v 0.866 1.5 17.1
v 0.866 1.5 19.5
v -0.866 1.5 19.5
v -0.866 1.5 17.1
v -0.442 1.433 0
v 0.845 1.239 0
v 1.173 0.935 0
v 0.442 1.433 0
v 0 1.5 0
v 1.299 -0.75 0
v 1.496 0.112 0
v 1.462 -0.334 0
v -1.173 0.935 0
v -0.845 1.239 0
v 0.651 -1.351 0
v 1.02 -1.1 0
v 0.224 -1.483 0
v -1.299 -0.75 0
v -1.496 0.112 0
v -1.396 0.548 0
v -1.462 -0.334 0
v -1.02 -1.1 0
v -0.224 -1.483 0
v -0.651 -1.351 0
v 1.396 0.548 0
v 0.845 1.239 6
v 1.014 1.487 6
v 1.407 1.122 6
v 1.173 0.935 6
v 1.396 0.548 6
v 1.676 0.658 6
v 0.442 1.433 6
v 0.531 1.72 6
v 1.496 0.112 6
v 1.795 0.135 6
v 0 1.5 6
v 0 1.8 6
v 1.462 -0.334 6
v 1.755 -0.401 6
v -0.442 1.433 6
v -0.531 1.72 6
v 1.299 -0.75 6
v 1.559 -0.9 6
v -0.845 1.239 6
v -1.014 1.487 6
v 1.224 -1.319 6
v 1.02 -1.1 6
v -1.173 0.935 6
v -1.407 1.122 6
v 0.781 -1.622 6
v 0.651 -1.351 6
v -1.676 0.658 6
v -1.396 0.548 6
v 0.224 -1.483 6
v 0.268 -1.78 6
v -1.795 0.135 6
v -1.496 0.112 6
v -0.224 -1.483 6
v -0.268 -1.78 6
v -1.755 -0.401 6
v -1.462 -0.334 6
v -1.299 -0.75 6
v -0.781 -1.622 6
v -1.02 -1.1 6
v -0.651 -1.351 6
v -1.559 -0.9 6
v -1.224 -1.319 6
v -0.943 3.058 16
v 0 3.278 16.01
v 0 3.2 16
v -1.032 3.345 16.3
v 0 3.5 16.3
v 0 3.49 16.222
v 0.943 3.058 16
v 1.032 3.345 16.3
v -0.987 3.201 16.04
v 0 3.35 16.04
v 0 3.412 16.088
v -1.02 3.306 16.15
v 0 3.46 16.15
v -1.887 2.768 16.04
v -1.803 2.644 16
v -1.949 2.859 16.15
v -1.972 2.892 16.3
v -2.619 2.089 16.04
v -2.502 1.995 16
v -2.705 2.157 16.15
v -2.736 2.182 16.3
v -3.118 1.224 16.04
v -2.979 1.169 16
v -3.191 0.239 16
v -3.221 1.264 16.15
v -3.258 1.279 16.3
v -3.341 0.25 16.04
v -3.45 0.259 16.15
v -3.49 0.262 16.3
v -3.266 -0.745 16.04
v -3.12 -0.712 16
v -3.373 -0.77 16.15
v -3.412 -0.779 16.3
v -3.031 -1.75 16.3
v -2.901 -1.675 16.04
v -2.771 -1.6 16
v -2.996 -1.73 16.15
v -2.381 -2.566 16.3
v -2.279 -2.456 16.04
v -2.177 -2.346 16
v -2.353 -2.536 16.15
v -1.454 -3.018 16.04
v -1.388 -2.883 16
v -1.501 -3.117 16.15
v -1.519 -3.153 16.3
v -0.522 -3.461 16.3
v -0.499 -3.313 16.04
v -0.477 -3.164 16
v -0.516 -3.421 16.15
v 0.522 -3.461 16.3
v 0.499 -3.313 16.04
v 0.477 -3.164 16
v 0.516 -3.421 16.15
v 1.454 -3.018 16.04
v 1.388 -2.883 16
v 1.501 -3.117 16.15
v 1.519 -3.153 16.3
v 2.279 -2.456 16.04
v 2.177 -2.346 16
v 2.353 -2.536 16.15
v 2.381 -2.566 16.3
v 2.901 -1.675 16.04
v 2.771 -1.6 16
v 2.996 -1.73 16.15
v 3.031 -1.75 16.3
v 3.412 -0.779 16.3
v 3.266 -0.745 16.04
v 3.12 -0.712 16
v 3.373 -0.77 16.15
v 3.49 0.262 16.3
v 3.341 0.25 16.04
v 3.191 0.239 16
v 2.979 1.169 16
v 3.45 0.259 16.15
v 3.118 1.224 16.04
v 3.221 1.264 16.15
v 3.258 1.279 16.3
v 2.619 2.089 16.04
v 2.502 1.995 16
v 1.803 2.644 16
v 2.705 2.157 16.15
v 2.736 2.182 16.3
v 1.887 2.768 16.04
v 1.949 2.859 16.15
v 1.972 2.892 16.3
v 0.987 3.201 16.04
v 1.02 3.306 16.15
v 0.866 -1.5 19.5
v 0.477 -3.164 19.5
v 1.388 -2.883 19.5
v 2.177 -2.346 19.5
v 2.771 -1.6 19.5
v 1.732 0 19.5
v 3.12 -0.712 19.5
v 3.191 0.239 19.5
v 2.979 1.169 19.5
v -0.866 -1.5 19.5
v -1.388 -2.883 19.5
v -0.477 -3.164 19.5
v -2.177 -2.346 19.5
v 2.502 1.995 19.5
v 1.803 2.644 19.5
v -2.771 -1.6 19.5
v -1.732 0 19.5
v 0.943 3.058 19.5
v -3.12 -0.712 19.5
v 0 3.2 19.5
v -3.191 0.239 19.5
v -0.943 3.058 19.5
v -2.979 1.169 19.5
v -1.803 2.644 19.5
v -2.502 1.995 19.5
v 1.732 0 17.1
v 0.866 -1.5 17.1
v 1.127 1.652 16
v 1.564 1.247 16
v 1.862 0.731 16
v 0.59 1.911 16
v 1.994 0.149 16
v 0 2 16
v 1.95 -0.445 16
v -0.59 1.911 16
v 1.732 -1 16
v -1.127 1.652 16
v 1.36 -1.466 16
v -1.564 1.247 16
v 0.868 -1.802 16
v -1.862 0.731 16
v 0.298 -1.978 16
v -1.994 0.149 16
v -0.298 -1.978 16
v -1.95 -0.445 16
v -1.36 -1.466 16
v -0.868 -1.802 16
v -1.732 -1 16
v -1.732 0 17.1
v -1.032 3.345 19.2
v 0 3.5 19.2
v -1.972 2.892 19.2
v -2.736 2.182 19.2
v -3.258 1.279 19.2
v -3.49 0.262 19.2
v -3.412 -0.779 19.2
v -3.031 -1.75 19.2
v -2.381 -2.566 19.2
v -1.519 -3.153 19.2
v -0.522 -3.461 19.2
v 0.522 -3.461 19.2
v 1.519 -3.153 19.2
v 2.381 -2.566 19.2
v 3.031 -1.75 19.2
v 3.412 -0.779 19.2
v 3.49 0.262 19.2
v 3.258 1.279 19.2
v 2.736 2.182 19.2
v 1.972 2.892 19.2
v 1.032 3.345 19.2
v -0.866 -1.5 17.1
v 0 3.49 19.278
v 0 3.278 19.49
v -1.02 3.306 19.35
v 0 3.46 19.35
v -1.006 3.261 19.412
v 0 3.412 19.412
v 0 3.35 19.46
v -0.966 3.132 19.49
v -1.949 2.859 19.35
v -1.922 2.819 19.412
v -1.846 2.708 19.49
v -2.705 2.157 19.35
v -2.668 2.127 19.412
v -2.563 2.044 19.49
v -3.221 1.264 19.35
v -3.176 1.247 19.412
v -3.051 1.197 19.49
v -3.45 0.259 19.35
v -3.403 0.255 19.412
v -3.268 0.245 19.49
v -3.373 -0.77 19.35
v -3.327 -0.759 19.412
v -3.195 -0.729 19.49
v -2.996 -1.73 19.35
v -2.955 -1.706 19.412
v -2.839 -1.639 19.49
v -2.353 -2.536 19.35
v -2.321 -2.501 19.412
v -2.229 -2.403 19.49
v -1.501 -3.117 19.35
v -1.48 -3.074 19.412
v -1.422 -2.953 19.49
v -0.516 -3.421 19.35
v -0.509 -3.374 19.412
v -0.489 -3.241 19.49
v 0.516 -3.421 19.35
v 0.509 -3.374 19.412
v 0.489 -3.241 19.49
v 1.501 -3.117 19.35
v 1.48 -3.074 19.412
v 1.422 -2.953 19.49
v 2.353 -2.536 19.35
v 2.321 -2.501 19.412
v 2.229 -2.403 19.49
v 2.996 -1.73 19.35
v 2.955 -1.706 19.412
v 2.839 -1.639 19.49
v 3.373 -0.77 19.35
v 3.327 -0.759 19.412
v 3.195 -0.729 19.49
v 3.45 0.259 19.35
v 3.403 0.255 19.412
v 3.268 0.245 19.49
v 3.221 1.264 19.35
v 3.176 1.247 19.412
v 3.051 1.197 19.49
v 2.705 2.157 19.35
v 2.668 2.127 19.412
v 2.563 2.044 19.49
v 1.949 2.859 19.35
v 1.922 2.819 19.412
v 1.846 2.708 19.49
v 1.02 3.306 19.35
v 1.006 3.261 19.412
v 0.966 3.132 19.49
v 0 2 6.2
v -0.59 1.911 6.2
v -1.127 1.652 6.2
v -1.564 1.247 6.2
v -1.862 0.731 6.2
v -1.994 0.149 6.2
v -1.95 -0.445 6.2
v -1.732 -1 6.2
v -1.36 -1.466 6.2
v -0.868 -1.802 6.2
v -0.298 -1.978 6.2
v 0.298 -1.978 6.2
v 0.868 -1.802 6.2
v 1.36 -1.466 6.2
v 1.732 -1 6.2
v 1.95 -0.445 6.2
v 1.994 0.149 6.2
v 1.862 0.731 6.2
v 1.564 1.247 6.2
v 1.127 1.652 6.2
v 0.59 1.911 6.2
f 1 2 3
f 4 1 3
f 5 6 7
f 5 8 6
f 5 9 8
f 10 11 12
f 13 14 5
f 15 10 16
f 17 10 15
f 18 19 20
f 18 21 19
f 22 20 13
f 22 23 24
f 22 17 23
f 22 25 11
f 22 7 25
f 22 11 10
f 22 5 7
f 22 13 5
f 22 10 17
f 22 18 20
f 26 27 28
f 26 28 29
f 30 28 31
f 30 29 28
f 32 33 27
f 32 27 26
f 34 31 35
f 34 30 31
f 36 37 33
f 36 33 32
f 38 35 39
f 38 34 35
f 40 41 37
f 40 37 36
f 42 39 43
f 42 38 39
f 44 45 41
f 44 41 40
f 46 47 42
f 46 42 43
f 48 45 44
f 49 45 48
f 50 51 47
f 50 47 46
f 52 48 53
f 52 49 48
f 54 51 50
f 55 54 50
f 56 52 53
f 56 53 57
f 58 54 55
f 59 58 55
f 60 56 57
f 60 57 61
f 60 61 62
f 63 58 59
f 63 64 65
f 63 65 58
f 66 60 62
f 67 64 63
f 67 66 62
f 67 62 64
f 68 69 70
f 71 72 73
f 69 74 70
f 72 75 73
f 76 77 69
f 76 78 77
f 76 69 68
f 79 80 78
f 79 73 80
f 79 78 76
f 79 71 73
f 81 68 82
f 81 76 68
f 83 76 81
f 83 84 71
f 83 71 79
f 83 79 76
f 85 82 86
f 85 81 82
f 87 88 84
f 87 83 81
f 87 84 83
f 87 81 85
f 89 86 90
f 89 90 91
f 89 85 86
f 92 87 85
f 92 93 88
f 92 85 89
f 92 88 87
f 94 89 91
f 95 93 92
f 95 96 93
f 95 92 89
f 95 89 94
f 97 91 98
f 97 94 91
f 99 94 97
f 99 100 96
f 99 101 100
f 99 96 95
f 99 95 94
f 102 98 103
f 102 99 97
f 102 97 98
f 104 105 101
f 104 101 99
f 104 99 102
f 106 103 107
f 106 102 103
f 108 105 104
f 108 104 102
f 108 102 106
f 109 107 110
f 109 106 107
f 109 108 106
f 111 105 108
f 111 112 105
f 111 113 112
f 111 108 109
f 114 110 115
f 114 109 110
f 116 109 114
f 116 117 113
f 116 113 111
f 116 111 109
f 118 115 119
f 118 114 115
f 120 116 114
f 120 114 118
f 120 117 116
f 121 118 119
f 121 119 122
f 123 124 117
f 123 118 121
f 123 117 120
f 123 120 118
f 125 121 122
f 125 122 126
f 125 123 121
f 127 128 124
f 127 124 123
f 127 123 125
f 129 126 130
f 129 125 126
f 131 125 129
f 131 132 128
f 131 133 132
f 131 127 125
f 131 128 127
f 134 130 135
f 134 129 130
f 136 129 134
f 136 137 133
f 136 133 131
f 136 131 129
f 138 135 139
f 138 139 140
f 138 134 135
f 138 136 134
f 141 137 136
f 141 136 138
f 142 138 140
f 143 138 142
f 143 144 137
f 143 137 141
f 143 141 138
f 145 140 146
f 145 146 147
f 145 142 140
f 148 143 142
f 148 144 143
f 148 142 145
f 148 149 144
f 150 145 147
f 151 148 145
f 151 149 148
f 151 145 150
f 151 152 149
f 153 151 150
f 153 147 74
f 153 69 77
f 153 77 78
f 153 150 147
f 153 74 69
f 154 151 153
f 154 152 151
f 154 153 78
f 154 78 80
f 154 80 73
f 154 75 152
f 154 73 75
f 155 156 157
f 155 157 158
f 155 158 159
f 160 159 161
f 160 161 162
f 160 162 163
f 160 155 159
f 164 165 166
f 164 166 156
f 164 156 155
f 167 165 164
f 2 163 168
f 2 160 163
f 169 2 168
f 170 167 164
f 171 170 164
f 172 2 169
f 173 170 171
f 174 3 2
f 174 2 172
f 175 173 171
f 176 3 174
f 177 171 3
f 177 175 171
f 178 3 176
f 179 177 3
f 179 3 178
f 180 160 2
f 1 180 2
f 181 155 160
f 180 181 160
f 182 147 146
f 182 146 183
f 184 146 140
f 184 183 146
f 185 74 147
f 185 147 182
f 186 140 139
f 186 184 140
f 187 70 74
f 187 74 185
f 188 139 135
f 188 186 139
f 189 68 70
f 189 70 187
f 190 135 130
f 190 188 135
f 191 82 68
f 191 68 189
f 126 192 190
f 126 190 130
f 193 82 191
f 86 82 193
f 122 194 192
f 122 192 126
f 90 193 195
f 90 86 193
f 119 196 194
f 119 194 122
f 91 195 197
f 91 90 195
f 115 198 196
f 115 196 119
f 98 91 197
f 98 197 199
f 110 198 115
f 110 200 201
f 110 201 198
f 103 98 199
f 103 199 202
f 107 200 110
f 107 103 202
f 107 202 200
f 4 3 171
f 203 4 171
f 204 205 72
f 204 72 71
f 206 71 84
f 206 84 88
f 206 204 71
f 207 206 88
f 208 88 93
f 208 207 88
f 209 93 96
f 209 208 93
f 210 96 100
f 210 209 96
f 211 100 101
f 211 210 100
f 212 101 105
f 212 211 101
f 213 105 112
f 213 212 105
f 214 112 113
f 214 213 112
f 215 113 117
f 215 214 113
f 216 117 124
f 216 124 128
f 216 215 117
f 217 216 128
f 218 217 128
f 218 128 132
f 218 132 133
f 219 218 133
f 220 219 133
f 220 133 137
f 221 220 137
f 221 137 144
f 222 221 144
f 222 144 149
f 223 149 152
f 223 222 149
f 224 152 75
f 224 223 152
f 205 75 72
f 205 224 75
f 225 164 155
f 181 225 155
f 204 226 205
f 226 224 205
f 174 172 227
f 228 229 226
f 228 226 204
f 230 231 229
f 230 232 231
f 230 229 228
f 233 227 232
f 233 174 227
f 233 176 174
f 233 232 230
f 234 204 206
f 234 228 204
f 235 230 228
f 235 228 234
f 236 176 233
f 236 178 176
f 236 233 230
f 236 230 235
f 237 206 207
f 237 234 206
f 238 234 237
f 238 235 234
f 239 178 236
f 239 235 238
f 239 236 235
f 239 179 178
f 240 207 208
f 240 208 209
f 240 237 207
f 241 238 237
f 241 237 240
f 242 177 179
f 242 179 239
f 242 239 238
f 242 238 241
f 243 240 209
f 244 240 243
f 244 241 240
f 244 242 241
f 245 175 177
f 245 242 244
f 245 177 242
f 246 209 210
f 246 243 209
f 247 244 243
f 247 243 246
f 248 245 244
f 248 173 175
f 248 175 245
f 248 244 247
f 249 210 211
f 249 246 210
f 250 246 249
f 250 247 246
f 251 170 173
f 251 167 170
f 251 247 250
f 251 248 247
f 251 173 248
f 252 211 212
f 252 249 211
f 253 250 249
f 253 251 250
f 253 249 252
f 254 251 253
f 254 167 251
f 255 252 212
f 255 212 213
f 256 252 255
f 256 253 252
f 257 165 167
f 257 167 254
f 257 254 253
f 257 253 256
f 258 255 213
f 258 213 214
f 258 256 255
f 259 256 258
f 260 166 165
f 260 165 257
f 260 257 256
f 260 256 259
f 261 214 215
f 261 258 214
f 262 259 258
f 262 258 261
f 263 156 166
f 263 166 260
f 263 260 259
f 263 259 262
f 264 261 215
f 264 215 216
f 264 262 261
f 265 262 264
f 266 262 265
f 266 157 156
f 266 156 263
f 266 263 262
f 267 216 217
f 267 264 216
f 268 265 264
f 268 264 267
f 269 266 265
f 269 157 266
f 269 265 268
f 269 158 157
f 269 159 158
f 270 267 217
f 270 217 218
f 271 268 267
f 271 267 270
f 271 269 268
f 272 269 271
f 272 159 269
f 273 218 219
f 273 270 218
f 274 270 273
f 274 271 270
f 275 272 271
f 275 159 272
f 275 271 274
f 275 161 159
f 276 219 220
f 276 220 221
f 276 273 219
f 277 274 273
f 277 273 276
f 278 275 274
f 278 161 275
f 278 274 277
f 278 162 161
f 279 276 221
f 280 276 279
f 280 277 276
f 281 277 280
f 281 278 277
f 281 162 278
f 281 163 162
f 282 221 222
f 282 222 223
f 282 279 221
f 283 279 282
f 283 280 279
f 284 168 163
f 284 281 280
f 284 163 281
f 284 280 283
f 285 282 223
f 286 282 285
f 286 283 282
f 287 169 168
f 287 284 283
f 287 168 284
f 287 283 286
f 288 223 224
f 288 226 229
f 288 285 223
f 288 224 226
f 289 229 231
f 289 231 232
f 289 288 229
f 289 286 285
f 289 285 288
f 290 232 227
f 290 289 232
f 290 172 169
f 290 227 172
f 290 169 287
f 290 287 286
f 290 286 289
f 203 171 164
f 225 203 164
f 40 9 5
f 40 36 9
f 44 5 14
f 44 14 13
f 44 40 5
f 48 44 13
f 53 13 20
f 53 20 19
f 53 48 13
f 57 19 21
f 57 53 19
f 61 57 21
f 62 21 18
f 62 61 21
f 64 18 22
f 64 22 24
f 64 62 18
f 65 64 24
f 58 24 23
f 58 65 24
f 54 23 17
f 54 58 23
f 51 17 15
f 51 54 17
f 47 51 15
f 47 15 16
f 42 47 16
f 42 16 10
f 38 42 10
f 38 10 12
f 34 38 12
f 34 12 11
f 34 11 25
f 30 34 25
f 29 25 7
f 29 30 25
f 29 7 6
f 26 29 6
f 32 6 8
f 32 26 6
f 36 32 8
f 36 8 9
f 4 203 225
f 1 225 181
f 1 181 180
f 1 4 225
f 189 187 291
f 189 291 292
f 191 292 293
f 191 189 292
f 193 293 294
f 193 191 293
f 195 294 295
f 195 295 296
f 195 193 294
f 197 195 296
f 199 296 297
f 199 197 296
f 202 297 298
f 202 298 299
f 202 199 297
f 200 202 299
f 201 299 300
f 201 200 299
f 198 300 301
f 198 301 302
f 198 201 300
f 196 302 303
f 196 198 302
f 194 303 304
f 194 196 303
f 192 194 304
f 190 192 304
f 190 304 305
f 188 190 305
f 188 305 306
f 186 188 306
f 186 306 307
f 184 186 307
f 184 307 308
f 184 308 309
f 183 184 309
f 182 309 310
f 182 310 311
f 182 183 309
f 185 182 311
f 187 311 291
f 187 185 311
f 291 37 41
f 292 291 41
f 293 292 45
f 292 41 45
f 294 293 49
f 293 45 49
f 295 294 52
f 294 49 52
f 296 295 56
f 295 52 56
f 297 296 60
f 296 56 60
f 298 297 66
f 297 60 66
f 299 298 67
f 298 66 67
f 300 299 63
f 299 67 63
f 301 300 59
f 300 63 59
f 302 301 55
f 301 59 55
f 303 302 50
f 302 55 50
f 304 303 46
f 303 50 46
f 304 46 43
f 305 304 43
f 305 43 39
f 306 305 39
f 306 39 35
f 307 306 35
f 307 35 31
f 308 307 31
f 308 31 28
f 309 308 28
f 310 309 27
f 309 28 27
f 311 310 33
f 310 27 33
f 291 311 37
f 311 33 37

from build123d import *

# Parameters (mm, degrees)
FILLET_1_R          = 0.3
CUT_EXTRUDE_1_DEPTH = 2.4
CHAMFER_1_SIZE      = 0.2


with BuildPart() as part:
    # 草图1 → 旋转1 (revolve)
    with BuildSketch(Plane(origin=(0, 0, 0), x_dir=(0, 0, -1), z_dir=(1, 0, 0))):
        Polygon((0, 0), (0, 1.5), (-6, 1.5), (-6, 2), (-16, 2), (-16, 3.5), (-19.5, 3.5), (-19.5, 0), align=None)
    revolve(axis=Axis((0, 0, 0), (0, 0, 1)))

    # 圆角1
    fillet_1_edges = [part.edges().sort_by_distance(p)[0] for p in [
        (0, -3.5, 19.5),
        (0, -3.5, 16),
    ]]
    fillet(fillet_1_edges, radius=FILLET_1_R)

    # 草图2 → 切除-拉伸1 (cut)
    with BuildSketch(Plane.XY.offset(19.5)):
        Polygon((1.732050808, 0), (0.866025404, 1.5), (-0.866025404, 1.5), (-1.732050808, 0), (-0.866025404, -1.5), (0.866025404, -1.5), align=None)
    extrude(amount=-CUT_EXTRUDE_1_DEPTH, mode=Mode.SUBTRACT)

    # 倒角1
    chamfer_1_edges = [part.edges().sort_by_distance(p)[0] for p in [
        (0, -2, 6),
    ]]
    chamfer(chamfer_1_edges, length=CHAMFER_1_SIZE)


solid = part.part
